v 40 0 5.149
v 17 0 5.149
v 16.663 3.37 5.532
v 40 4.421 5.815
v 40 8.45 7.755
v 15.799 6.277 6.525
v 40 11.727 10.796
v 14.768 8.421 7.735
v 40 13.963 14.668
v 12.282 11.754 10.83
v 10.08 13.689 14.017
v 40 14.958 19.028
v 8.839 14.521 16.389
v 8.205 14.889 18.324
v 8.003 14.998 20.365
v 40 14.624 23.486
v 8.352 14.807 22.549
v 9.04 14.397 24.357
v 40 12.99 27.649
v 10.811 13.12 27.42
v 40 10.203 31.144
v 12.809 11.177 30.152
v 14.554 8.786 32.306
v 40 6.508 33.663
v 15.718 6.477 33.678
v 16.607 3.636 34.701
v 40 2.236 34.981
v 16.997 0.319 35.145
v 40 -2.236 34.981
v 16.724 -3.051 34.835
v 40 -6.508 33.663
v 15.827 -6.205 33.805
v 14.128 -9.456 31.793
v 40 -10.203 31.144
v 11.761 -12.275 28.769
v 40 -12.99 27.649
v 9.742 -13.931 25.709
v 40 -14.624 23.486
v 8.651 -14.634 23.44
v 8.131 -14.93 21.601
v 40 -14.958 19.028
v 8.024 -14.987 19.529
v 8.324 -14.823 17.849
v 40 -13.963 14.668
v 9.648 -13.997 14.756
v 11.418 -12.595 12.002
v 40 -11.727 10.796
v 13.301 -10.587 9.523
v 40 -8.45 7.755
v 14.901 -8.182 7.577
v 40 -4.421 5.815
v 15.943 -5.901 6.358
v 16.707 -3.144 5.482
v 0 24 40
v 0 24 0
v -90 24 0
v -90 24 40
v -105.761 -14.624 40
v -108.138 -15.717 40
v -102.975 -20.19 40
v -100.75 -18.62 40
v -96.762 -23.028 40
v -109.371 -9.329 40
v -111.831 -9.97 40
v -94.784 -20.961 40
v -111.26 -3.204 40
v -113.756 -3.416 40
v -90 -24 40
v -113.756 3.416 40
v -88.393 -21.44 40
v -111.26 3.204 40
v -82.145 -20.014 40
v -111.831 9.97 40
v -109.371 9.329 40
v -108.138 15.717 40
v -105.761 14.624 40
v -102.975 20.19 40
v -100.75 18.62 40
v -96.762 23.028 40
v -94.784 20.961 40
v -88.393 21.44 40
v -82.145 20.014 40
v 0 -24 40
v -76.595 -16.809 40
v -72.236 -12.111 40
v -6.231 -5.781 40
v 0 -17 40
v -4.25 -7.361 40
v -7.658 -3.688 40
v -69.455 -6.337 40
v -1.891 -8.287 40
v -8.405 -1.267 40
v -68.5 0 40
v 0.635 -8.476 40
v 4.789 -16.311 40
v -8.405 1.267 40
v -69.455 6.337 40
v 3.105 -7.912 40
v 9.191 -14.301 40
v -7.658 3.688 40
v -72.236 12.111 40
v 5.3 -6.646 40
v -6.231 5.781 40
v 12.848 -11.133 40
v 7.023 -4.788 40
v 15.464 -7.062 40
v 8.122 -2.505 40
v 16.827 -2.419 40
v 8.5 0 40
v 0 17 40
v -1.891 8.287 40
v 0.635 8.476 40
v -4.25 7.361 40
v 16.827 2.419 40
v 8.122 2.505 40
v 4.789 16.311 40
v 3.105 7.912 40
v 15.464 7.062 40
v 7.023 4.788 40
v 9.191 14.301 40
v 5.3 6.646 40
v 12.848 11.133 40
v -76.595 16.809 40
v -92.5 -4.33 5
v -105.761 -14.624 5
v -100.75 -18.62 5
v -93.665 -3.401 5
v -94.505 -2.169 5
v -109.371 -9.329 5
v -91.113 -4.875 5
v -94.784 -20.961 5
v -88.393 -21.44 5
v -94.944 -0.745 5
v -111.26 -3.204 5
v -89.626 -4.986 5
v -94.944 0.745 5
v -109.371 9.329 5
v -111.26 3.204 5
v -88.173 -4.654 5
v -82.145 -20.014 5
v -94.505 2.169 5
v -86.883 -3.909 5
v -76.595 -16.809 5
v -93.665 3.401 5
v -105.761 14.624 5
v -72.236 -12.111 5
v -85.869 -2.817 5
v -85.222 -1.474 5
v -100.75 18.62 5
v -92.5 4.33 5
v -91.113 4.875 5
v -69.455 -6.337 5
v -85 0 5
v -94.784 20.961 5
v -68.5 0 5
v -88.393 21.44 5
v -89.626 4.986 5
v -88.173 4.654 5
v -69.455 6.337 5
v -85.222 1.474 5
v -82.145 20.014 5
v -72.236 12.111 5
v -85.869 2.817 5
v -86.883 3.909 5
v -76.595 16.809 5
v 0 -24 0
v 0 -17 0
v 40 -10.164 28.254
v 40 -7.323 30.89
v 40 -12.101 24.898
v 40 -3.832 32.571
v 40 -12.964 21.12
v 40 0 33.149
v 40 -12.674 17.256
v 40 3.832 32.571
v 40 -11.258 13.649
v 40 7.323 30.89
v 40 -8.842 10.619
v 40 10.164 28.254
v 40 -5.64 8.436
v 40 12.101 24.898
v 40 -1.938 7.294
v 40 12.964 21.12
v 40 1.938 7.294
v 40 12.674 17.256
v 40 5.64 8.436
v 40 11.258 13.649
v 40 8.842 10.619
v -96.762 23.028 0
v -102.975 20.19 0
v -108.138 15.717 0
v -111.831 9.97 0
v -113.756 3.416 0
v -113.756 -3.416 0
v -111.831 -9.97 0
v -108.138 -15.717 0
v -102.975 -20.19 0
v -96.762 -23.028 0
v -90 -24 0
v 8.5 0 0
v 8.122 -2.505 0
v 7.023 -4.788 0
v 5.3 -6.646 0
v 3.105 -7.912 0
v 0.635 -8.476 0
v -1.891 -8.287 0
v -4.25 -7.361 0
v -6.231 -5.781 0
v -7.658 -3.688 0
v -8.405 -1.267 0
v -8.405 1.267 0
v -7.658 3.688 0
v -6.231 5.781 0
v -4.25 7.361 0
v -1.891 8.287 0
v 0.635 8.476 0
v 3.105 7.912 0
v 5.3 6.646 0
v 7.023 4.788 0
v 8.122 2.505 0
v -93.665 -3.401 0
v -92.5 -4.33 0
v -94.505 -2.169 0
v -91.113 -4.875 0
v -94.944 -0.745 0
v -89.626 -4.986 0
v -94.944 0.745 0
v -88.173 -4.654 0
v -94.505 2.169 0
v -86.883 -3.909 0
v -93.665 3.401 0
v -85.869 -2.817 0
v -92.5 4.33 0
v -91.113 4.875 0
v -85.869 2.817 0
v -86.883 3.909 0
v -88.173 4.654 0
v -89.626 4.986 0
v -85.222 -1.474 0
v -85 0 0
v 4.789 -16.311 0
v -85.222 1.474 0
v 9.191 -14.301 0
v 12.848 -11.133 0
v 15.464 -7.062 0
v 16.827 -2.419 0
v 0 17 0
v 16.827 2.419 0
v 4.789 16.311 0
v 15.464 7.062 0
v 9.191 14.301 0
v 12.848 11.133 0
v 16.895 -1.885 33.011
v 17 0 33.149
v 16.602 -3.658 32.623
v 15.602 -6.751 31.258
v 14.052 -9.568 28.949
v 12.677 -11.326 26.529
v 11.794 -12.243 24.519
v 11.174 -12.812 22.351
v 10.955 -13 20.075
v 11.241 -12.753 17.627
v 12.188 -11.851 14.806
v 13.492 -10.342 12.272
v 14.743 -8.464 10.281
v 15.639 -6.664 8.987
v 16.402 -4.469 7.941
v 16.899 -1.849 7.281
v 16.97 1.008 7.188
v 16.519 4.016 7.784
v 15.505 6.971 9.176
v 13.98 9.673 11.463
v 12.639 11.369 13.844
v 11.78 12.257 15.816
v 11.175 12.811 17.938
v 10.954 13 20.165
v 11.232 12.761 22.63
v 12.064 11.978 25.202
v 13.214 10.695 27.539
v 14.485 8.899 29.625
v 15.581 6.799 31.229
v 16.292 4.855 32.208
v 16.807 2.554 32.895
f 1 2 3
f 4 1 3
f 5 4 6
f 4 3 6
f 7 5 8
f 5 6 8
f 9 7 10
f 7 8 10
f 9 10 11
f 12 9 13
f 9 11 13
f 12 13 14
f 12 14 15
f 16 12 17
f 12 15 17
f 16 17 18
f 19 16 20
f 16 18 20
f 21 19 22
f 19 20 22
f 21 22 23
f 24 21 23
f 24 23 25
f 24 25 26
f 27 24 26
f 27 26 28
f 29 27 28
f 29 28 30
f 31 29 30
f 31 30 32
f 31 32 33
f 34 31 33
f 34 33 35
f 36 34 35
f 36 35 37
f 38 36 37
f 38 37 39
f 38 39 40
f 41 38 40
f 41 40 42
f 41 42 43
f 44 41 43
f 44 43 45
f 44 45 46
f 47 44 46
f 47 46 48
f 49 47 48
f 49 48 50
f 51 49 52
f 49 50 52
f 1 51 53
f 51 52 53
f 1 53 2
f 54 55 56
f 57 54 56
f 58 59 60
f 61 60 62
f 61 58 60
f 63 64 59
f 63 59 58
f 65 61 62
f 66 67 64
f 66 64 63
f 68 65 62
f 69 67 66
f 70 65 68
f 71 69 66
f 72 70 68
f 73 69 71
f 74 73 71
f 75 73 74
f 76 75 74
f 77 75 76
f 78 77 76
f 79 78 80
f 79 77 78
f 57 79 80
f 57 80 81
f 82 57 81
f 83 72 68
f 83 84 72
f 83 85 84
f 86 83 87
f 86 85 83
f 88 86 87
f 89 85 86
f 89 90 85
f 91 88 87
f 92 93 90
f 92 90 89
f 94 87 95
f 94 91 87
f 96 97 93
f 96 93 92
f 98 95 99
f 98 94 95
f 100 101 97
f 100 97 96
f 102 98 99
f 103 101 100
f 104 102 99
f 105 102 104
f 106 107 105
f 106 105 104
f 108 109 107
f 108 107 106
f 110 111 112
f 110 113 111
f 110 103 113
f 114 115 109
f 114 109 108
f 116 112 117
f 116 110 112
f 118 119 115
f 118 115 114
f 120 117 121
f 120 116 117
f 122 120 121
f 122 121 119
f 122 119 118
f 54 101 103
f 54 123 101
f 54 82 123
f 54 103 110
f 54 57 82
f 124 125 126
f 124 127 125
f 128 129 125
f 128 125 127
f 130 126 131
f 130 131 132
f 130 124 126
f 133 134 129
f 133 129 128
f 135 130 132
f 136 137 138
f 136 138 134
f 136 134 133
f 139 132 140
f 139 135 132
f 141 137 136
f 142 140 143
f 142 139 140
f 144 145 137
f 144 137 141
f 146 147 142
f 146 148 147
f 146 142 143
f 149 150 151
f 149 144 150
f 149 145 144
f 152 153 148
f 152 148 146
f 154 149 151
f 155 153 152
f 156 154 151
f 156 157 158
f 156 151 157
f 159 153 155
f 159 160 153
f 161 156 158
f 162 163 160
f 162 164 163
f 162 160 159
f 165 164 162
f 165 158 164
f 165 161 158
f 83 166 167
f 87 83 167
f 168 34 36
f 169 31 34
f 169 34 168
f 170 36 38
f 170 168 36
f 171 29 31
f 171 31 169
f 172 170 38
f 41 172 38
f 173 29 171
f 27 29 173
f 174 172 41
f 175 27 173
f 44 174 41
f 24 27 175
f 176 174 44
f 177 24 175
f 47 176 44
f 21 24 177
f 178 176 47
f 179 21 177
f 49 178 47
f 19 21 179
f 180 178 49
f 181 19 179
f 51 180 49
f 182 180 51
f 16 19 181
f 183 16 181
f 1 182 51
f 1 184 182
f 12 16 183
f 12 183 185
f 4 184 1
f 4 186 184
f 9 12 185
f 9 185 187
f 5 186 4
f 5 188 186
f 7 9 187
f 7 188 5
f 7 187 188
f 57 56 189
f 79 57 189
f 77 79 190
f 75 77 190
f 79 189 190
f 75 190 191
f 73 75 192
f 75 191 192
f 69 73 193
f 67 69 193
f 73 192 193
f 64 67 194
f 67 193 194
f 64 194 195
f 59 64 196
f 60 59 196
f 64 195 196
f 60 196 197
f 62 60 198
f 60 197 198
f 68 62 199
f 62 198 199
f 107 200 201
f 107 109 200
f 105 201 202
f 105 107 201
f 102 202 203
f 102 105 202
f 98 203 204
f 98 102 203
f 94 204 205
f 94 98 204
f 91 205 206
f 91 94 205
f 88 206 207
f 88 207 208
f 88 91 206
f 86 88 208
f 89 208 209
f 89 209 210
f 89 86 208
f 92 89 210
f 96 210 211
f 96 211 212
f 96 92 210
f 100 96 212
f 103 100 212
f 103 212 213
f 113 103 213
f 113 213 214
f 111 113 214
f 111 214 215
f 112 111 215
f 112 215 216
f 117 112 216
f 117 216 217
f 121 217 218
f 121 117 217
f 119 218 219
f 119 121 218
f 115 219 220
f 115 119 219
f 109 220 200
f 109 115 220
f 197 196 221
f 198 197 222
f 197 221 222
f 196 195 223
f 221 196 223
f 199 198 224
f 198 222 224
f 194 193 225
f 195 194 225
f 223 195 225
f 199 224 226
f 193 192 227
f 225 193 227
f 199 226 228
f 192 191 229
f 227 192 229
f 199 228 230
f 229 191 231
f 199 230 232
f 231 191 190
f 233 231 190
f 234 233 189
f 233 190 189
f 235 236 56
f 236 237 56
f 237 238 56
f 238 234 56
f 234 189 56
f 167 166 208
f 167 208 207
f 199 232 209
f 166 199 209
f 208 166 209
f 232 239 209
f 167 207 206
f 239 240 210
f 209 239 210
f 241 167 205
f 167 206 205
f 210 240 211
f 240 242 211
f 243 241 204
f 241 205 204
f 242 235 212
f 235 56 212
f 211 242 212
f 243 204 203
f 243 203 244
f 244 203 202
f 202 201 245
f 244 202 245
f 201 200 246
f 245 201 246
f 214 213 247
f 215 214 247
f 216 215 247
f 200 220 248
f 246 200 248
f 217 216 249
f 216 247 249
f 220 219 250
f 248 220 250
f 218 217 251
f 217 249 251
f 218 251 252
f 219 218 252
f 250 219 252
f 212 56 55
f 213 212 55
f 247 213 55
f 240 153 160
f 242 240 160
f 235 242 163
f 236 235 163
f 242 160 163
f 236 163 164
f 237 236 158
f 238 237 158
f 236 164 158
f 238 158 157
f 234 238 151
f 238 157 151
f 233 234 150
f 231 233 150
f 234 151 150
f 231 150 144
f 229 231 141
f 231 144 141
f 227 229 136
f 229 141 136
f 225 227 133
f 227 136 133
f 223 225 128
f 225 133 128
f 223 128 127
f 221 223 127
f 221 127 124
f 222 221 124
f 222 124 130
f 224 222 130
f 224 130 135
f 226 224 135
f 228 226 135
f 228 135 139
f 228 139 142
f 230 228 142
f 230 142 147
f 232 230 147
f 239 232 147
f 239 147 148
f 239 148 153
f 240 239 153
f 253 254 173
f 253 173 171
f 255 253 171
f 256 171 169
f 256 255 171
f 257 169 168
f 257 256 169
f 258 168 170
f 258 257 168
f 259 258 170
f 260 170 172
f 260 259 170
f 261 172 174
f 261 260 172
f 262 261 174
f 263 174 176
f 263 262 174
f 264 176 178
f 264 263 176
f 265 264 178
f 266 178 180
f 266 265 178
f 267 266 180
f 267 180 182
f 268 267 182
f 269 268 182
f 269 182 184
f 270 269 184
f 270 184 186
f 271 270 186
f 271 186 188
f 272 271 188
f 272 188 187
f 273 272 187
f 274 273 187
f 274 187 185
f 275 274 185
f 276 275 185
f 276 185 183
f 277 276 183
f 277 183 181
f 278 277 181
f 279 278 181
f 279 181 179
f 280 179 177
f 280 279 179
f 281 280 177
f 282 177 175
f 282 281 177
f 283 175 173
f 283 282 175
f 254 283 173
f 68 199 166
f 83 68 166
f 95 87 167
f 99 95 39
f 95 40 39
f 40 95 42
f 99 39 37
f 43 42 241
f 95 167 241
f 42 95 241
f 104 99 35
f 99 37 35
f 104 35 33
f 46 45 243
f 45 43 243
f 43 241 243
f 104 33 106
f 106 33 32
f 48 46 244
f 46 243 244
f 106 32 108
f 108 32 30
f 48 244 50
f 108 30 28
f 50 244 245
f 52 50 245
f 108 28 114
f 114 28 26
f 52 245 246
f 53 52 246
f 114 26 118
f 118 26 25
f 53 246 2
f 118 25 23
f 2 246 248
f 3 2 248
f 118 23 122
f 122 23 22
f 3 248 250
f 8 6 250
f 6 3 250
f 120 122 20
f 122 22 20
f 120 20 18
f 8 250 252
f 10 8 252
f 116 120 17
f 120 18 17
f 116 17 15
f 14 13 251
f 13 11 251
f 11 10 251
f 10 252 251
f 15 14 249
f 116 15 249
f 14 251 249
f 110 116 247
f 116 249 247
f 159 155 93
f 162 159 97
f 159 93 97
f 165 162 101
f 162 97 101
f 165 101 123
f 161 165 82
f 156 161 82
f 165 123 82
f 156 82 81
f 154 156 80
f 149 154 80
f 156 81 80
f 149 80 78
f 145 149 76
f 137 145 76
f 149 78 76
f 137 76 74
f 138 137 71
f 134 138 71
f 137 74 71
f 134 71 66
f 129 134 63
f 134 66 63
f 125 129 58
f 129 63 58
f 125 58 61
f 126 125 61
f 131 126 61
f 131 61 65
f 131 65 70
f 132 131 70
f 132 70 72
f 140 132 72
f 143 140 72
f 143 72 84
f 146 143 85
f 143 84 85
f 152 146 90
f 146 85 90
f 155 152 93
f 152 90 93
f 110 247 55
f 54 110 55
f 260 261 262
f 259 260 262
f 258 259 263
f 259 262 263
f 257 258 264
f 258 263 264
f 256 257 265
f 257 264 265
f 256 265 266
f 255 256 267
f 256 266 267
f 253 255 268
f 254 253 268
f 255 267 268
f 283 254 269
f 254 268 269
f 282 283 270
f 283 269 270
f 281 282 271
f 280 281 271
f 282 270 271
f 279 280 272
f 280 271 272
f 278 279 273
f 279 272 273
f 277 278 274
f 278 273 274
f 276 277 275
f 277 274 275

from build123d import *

# Parameters (mm, degrees)
SKETCH1_R           = 17
BOSS_EXTRUDE2_DEPTH = 40
SKETCH2_R           = 8.5
CUT_EXTRUDE1_DEPTH  = 38
CUT_EXTRUDE2_START  = -38
SKETCH3_R           = 8.5
CUT_EXTRUDE2_DEPTH  = 38
SKETCH4_R           = 15
SKETCH4_R_2         = 13
BOSS_EXTRUDE3_DEPTH = 40
CUT_EXTRUDE4_START  = -50
SKETCH6_R           = 8.5
CUT_EXTRUDE4_DEPTH  = 50
BOSS_EXTRUDE4_START = -40
BOSS_EXTRUDE4_DEPTH = 40
SKETCH11_R          = 21.5
CUT_EXTRUDE5_DEPTH  = 35
SKETCH12_R          = 5
CUT_EXTRUDE6_DEPTH  = 122.642920086


with BuildPart() as part:
    # Sketch1 → Boss-Extrude2 (new body)
    with BuildSketch(Plane.XY):
        Circle(SKETCH1_R)
    extrude(amount=BOSS_EXTRUDE2_DEPTH)

    # Sketch2 → Cut-Extrude1 (cut)
    with BuildSketch(Plane.XY.offset(40)):
        Circle(SKETCH2_R)
    extrude(amount=-CUT_EXTRUDE1_DEPTH, mode=Mode.SUBTRACT)

    # Sketch3 → Cut-Extrude2 (cut)
    with BuildSketch(Plane(origin=(0, 0, 0), x_dir=(-1, 0, 0), z_dir=(0, 0, -1)).offset(CUT_EXTRUDE2_START)):
        with Locations(Location((0, 0, 0), (0, 0, 180))):
            Circle(SKETCH3_R)
    extrude(amount=CUT_EXTRUDE2_DEPTH, mode=Mode.SUBTRACT)

    # Sketch4 → Boss-Extrude3 (add)
    with BuildSketch(Plane(origin=(0, 0, 0), x_dir=(0, 0, -1), z_dir=(1, 0, 0))):
        with Locations((-20.148533522, 0)):
            Circle(SKETCH4_R)
        with Locations(Location((-20.148533522, 0, 0), (0, 0, 180))):
            Circle(SKETCH4_R_2, mode=Mode.SUBTRACT)
    extrude(amount=BOSS_EXTRUDE3_DEPTH)

    # Sketch6 → Cut-Extrude4 (cut)
    with BuildSketch(Plane(origin=(0, 0, 0), x_dir=(-1, 0, 0), z_dir=(0, 0, -1)).offset(CUT_EXTRUDE4_START)):
        with Locations(Location((0, 0, 0), (0, 0, 180))):
            Circle(SKETCH6_R)
    extrude(amount=CUT_EXTRUDE4_DEPTH, mode=Mode.SUBTRACT)

    # Sketch9 → Boss-Extrude4 (add)
    with BuildSketch(Plane.XY.offset(40).offset(BOSS_EXTRUDE4_START)):
        with BuildLine():
            ThreePointArc((-90, 24), (-114, 0), (-90, -24))
            Line((-90, -24), (0, -24))
            Line((0, -24), (0, -17))
            ThreePointArc((0, -17), (-17, 0), (0, 17))
            Line((0, 17), (0, 24))
            Line((0, 24), (-90, 24))
        make_face()
    extrude(amount=BOSS_EXTRUDE4_DEPTH)

    # Sketch11 → Cut-Extrude5 (cut)
    with BuildSketch(Plane.XY.offset(40)):
        with Locations((-90, 0)):
            Circle(SKETCH11_R)
    extrude(amount=-CUT_EXTRUDE5_DEPTH, mode=Mode.SUBTRACT)

    # Sketch12 → Cut-Extrude6 (cut, through all)
    with BuildSketch(Plane.XY.offset(5)):
        with Locations((-90, 0)):
            Circle(SKETCH12_R)
    extrude(amount=-CUT_EXTRUDE6_DEPTH, mode=Mode.SUBTRACT)


solid = part.part
